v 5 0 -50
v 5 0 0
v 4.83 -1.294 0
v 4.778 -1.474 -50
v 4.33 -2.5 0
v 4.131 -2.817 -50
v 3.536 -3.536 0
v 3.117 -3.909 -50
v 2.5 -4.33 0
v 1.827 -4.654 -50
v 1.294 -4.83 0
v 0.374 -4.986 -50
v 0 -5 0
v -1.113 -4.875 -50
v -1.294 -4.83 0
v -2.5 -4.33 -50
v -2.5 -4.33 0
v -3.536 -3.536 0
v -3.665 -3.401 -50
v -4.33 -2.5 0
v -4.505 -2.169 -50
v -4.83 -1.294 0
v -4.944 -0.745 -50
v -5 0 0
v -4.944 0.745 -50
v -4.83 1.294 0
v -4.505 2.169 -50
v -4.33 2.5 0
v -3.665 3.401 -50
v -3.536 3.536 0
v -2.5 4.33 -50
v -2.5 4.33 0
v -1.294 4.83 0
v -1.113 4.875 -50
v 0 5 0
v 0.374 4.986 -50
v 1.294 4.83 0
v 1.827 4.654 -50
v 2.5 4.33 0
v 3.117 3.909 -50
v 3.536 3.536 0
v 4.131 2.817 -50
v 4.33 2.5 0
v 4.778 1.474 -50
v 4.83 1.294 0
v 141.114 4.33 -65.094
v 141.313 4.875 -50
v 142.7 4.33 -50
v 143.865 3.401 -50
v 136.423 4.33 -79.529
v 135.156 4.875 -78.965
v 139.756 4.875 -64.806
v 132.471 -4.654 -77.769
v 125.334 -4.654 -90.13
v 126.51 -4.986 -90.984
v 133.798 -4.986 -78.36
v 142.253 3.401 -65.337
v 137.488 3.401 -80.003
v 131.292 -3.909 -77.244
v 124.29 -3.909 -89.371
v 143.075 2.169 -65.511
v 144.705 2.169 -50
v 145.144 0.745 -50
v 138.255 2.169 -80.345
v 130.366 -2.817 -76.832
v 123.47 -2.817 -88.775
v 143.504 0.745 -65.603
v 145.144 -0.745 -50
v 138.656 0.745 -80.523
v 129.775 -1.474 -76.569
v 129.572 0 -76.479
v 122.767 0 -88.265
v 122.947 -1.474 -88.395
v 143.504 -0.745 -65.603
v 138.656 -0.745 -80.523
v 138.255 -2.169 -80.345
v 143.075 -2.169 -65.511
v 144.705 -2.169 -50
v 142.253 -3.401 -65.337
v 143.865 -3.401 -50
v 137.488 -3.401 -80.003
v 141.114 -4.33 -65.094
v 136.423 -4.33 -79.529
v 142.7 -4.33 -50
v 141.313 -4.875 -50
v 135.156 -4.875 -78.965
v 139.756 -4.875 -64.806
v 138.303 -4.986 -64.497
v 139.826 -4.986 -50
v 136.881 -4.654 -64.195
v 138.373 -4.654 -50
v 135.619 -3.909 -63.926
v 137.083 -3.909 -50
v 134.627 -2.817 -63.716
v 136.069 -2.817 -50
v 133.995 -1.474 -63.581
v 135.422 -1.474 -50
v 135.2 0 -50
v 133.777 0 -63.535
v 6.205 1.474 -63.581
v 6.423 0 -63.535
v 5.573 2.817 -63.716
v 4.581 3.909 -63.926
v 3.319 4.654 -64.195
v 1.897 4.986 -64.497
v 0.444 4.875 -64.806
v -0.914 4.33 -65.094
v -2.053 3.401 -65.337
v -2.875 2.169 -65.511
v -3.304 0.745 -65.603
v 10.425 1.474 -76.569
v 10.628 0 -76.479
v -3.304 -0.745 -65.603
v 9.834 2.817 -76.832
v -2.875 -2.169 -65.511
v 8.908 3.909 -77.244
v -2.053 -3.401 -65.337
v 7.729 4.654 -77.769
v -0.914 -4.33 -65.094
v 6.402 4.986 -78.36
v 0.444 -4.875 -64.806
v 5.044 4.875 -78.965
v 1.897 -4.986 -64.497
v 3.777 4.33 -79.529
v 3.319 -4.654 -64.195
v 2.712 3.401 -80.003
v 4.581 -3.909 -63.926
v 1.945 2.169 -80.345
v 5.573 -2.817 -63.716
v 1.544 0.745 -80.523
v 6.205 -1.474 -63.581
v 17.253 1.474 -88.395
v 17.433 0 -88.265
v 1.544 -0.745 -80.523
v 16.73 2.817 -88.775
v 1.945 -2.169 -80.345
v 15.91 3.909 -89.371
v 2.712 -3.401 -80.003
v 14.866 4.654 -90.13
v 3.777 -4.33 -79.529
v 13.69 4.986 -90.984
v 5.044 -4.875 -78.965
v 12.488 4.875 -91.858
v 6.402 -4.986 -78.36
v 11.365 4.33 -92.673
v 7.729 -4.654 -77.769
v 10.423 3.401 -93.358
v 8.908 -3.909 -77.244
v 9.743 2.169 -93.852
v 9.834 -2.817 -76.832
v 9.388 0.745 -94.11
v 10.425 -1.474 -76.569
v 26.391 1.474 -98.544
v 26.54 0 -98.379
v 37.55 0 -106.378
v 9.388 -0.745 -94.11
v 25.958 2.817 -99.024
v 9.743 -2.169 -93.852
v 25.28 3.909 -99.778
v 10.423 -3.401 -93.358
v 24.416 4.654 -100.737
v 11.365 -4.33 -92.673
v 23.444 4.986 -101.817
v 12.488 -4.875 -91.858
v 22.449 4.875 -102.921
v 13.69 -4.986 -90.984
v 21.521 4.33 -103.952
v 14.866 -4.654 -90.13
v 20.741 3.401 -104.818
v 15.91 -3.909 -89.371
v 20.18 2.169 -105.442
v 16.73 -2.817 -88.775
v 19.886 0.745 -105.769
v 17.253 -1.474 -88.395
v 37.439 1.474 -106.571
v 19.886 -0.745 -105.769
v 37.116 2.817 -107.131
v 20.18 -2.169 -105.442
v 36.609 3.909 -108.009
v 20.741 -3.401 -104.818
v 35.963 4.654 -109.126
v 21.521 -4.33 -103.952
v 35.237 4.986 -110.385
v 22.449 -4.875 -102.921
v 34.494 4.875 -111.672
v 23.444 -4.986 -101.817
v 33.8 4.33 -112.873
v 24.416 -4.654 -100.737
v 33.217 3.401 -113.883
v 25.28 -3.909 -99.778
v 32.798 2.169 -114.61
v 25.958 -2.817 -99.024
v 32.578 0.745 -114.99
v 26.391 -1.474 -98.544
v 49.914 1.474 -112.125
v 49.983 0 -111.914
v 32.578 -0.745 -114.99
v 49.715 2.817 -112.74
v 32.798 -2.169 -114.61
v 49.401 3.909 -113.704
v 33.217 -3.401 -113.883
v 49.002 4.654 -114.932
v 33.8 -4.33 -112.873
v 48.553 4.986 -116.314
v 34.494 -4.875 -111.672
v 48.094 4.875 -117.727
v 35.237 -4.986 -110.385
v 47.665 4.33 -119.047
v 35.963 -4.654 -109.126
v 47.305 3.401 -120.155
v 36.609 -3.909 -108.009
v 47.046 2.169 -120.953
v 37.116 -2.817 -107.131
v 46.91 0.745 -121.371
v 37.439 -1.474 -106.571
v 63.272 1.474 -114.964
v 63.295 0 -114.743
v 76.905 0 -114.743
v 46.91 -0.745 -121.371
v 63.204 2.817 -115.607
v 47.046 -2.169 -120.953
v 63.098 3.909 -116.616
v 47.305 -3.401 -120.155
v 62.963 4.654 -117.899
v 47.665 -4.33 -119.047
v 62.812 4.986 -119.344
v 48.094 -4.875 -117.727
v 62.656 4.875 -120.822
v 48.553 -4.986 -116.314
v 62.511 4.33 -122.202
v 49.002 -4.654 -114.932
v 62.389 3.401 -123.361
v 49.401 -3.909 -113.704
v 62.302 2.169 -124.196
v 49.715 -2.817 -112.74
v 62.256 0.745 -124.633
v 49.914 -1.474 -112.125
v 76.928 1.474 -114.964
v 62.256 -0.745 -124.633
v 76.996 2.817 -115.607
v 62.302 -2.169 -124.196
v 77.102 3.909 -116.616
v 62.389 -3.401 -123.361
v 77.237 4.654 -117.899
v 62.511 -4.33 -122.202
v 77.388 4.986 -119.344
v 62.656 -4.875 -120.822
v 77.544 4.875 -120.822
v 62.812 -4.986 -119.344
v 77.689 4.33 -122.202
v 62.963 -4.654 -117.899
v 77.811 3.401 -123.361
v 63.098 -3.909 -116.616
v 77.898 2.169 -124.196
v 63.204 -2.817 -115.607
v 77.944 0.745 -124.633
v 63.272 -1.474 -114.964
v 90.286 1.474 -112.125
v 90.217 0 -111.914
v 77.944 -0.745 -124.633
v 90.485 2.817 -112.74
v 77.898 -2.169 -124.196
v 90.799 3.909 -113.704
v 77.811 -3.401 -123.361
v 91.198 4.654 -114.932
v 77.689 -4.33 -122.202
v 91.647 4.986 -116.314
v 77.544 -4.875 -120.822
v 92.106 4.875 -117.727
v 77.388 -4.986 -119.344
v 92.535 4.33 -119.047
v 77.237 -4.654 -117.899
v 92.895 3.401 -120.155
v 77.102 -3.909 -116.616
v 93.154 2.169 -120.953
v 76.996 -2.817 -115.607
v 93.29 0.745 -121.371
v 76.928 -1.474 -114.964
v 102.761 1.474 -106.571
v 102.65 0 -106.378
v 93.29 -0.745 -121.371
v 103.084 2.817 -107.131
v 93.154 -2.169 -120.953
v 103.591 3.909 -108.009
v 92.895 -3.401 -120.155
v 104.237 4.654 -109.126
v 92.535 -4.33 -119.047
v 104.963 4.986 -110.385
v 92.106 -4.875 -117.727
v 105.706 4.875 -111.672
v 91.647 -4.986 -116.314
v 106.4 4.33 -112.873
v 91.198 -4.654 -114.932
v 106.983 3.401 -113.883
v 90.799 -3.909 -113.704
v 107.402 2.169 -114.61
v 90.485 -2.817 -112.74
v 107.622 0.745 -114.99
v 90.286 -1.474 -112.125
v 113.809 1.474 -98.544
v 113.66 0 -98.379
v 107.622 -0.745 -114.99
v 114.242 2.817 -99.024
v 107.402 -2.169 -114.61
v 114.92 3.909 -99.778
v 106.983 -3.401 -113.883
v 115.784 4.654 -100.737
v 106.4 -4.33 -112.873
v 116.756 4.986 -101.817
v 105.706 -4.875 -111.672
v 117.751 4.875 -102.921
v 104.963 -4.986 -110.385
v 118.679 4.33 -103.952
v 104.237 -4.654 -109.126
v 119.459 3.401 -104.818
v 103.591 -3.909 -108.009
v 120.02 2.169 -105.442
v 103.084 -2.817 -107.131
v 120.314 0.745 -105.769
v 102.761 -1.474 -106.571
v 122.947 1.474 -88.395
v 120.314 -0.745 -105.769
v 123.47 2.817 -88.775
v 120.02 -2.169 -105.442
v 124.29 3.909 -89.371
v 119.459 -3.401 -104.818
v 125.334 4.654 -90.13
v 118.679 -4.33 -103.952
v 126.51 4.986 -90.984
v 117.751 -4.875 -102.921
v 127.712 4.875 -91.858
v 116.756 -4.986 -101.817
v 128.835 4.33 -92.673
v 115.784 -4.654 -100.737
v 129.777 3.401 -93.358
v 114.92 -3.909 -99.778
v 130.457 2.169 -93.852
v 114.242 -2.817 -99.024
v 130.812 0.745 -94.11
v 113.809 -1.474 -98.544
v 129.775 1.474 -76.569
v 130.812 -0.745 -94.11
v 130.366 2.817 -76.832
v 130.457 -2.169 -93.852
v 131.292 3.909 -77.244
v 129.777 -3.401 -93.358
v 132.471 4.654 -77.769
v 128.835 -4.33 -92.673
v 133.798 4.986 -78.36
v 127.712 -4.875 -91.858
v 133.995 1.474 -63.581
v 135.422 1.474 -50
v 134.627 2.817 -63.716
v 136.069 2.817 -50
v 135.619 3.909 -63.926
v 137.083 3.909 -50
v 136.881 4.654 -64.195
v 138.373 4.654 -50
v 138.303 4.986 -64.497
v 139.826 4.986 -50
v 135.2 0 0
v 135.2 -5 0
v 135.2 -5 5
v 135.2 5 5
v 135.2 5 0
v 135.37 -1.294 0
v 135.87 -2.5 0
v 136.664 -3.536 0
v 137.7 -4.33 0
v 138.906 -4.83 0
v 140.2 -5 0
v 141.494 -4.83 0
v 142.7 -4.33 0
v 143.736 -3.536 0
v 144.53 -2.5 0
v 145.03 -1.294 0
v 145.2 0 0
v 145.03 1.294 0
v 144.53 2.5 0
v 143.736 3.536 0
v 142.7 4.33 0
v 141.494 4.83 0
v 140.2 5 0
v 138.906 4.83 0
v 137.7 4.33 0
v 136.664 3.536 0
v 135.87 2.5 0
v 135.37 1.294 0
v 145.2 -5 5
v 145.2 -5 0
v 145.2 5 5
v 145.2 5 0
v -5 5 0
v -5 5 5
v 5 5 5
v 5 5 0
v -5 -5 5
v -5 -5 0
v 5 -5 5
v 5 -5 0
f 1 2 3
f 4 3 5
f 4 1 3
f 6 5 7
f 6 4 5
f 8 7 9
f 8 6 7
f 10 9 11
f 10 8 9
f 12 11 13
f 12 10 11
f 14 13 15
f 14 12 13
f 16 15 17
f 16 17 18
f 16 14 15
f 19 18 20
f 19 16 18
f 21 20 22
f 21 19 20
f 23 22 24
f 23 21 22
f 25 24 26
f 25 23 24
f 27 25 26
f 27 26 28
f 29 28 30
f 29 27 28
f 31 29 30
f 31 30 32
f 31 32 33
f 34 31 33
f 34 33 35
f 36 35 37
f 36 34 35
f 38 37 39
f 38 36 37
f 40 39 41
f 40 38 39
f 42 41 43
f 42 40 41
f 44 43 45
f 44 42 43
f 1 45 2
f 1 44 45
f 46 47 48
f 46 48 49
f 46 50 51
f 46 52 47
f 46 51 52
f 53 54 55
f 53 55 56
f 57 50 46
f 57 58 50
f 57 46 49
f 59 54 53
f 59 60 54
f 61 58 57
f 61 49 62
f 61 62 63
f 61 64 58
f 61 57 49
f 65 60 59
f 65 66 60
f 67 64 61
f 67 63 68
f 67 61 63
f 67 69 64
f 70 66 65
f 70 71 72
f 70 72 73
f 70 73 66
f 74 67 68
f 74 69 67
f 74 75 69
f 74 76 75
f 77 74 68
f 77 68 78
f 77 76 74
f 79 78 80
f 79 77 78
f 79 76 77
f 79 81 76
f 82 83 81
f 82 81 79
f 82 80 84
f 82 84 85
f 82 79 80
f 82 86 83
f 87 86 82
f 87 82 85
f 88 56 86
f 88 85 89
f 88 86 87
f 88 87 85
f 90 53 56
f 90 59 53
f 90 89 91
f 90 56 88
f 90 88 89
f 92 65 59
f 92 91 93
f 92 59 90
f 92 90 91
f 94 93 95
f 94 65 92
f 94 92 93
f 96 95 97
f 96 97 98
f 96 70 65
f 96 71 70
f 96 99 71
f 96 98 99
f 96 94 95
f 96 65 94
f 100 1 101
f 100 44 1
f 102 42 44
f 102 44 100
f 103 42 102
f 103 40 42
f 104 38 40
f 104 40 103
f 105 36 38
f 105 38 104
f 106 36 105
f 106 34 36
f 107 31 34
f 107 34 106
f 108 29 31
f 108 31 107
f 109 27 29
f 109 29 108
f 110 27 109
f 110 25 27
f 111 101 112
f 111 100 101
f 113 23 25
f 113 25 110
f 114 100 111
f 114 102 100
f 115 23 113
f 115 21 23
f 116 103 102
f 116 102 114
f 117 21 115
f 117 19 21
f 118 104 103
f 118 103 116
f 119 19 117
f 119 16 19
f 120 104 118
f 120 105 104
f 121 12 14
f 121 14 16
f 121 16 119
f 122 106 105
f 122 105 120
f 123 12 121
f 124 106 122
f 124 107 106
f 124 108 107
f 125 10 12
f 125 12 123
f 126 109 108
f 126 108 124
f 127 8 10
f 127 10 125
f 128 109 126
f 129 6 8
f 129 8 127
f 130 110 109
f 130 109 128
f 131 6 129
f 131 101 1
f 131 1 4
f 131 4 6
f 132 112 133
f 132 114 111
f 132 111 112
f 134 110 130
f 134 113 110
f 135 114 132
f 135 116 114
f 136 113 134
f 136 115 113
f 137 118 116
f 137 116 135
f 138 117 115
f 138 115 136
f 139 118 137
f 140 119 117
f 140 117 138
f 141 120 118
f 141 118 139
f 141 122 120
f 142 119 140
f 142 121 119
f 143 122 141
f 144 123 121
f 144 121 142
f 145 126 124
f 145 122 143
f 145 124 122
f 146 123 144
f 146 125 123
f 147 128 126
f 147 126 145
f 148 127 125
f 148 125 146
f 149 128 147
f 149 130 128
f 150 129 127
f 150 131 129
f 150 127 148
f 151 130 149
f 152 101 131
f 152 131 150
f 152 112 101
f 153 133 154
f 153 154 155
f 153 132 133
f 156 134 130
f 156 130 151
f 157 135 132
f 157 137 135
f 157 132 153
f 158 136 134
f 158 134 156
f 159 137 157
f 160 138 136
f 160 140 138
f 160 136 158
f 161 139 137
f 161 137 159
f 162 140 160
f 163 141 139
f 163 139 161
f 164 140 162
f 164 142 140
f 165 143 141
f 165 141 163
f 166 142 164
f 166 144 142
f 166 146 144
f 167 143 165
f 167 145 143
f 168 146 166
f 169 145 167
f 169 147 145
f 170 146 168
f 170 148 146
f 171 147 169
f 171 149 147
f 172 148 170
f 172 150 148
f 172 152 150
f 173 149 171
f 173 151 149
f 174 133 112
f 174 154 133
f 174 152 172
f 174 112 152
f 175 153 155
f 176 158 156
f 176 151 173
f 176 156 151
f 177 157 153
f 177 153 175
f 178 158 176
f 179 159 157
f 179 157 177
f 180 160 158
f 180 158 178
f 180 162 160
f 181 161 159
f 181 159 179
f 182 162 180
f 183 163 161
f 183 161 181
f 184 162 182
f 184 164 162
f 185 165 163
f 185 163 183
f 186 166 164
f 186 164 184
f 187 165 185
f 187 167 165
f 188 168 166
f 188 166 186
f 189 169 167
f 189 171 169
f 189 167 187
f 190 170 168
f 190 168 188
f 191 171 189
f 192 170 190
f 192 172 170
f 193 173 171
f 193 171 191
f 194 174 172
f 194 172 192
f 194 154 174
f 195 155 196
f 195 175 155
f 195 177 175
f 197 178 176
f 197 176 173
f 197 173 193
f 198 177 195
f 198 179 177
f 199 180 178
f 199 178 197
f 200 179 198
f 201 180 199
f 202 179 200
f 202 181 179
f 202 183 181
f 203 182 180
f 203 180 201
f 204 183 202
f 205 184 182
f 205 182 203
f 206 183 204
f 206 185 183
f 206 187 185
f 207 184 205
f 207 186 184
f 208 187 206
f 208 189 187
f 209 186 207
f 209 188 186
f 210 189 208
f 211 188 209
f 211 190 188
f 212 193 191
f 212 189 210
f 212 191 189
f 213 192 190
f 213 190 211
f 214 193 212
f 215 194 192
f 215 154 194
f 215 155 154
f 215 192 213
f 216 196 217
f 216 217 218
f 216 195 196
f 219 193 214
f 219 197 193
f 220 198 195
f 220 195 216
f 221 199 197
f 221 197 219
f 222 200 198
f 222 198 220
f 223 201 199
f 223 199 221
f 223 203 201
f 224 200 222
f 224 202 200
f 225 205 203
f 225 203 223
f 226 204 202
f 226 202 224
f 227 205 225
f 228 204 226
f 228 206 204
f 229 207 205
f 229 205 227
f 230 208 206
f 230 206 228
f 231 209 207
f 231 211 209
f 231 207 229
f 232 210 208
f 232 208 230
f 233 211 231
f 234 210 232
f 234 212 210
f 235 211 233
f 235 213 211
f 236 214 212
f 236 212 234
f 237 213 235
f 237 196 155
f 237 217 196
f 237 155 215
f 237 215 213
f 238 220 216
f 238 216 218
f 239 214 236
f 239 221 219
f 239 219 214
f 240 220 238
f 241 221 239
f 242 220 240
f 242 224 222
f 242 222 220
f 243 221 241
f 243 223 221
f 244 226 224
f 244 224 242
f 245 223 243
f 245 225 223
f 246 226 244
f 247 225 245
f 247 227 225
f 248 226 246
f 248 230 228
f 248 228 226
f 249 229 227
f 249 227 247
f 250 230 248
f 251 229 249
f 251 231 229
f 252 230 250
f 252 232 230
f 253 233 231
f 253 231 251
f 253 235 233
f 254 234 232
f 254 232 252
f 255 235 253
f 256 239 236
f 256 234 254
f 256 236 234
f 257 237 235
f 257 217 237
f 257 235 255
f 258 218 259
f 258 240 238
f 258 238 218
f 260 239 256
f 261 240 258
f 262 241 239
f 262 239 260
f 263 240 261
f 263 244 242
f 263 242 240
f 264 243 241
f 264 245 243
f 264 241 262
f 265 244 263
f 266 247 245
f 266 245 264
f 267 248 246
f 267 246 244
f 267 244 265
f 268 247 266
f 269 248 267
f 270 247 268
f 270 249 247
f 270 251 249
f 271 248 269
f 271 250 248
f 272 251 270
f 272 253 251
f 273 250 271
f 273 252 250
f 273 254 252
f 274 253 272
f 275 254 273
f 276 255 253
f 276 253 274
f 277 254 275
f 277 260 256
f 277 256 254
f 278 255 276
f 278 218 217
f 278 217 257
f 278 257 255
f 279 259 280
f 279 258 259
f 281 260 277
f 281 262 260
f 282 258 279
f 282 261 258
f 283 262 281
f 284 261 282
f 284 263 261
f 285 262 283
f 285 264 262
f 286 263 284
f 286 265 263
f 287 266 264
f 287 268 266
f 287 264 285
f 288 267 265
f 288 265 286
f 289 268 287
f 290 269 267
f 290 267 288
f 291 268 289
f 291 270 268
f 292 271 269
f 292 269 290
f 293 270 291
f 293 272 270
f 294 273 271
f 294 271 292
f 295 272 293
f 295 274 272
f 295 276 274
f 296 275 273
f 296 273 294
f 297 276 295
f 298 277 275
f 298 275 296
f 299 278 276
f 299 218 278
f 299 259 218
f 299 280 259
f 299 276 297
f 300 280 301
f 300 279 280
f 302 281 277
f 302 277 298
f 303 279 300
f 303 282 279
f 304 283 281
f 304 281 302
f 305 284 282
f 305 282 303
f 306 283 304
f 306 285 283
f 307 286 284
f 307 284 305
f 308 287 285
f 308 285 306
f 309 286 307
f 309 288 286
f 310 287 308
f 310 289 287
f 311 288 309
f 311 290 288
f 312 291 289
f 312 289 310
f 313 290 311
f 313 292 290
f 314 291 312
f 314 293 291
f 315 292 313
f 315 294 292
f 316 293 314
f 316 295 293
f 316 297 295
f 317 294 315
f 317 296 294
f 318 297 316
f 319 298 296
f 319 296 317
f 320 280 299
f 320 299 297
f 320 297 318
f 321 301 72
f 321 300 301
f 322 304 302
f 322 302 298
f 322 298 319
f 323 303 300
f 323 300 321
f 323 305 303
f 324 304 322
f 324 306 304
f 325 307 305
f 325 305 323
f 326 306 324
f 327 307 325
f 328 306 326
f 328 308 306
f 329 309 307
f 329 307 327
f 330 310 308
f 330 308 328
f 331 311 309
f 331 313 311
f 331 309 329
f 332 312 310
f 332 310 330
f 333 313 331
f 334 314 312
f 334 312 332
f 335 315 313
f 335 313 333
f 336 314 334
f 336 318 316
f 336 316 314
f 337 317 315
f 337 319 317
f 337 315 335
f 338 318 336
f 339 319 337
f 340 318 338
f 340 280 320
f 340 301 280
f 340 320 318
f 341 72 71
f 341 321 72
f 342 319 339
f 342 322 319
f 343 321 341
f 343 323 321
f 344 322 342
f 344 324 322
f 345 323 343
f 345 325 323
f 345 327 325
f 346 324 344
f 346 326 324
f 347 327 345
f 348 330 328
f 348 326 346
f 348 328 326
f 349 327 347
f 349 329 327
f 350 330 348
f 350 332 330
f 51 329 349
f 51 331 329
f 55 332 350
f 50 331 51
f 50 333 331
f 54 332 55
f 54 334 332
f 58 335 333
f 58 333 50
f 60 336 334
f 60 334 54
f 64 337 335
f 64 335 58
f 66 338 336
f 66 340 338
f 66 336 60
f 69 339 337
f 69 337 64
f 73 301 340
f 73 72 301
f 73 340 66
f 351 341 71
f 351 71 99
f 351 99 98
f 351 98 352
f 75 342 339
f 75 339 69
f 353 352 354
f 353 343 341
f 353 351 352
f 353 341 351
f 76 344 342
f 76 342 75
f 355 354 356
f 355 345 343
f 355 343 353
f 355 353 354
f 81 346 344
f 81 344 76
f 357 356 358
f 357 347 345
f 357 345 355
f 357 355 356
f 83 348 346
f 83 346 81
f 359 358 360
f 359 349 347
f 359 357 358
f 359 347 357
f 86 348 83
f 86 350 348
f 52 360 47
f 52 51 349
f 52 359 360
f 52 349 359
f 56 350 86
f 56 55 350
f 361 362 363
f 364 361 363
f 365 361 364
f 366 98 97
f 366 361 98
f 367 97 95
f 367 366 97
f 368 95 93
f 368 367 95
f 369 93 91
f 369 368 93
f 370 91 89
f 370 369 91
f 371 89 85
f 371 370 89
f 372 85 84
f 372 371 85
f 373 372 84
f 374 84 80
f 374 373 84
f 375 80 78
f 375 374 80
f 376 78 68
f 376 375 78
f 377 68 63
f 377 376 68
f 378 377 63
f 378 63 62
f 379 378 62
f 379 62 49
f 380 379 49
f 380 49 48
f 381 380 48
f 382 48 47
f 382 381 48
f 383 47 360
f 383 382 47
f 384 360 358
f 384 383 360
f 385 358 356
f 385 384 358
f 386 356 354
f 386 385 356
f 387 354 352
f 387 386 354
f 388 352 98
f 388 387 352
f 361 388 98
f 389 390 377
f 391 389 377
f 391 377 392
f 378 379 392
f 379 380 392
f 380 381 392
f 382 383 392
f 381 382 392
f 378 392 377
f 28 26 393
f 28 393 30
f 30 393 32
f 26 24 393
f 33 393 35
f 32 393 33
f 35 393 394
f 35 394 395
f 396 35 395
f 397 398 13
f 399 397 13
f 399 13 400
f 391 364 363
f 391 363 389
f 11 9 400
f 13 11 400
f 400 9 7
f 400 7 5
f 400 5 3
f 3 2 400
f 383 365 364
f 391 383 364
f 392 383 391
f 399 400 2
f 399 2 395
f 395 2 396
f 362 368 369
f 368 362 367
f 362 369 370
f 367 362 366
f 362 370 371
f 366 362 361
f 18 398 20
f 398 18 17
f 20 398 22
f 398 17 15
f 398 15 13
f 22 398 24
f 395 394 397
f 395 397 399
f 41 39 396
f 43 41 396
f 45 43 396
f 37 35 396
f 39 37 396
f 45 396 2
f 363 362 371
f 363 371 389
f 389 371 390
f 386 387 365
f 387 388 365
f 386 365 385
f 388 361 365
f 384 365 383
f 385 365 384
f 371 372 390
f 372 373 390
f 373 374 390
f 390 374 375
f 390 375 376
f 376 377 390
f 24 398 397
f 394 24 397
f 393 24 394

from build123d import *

# Parameters (mm, degrees)
SKETCH6_R           = 5
SKETCH8_W           = 10
SKETCH8_H           = 10
BOSS_EXTRUDE1_DEPTH = 5
SKETCH9_W           = 10
SKETCH9_H           = 10
BOSS_EXTRUDE2_DEPTH = 5


with BuildPart() as part:
    # Sweep1: sweep along a path in Sketch7
    with BuildLine(Plane(origin=(0, 0, 0), x_dir=(1, 0, 0), z_dir=(0, 1, 0))) as sweep1_path:
        Line((0, 0), (0, 50))
        ThreePointArc((0, 50), (70.1, 120.1), (140.2, 50))
        Line((140.2, 50), (140.2, 0))
    # Sketch6 → Sweep1 (sweep)
    with BuildSketch(Plane.XY):
        Circle(SKETCH6_R)
    sweep(path=sweep1_path.line)

    # Sketch8 → Boss-Extrude1 (add)
    with BuildSketch(Plane.XY):
        Rectangle(SKETCH8_W, SKETCH8_H)
    extrude(amount=BOSS_EXTRUDE1_DEPTH)

    # Sketch9 → Boss-Extrude2 (add)
    with BuildSketch(Plane.XY):
        with Locations((140.2, 0)):
            Rectangle(SKETCH9_W, SKETCH9_H)
    extrude(amount=BOSS_EXTRUDE2_DEPTH)


solid = part.part
